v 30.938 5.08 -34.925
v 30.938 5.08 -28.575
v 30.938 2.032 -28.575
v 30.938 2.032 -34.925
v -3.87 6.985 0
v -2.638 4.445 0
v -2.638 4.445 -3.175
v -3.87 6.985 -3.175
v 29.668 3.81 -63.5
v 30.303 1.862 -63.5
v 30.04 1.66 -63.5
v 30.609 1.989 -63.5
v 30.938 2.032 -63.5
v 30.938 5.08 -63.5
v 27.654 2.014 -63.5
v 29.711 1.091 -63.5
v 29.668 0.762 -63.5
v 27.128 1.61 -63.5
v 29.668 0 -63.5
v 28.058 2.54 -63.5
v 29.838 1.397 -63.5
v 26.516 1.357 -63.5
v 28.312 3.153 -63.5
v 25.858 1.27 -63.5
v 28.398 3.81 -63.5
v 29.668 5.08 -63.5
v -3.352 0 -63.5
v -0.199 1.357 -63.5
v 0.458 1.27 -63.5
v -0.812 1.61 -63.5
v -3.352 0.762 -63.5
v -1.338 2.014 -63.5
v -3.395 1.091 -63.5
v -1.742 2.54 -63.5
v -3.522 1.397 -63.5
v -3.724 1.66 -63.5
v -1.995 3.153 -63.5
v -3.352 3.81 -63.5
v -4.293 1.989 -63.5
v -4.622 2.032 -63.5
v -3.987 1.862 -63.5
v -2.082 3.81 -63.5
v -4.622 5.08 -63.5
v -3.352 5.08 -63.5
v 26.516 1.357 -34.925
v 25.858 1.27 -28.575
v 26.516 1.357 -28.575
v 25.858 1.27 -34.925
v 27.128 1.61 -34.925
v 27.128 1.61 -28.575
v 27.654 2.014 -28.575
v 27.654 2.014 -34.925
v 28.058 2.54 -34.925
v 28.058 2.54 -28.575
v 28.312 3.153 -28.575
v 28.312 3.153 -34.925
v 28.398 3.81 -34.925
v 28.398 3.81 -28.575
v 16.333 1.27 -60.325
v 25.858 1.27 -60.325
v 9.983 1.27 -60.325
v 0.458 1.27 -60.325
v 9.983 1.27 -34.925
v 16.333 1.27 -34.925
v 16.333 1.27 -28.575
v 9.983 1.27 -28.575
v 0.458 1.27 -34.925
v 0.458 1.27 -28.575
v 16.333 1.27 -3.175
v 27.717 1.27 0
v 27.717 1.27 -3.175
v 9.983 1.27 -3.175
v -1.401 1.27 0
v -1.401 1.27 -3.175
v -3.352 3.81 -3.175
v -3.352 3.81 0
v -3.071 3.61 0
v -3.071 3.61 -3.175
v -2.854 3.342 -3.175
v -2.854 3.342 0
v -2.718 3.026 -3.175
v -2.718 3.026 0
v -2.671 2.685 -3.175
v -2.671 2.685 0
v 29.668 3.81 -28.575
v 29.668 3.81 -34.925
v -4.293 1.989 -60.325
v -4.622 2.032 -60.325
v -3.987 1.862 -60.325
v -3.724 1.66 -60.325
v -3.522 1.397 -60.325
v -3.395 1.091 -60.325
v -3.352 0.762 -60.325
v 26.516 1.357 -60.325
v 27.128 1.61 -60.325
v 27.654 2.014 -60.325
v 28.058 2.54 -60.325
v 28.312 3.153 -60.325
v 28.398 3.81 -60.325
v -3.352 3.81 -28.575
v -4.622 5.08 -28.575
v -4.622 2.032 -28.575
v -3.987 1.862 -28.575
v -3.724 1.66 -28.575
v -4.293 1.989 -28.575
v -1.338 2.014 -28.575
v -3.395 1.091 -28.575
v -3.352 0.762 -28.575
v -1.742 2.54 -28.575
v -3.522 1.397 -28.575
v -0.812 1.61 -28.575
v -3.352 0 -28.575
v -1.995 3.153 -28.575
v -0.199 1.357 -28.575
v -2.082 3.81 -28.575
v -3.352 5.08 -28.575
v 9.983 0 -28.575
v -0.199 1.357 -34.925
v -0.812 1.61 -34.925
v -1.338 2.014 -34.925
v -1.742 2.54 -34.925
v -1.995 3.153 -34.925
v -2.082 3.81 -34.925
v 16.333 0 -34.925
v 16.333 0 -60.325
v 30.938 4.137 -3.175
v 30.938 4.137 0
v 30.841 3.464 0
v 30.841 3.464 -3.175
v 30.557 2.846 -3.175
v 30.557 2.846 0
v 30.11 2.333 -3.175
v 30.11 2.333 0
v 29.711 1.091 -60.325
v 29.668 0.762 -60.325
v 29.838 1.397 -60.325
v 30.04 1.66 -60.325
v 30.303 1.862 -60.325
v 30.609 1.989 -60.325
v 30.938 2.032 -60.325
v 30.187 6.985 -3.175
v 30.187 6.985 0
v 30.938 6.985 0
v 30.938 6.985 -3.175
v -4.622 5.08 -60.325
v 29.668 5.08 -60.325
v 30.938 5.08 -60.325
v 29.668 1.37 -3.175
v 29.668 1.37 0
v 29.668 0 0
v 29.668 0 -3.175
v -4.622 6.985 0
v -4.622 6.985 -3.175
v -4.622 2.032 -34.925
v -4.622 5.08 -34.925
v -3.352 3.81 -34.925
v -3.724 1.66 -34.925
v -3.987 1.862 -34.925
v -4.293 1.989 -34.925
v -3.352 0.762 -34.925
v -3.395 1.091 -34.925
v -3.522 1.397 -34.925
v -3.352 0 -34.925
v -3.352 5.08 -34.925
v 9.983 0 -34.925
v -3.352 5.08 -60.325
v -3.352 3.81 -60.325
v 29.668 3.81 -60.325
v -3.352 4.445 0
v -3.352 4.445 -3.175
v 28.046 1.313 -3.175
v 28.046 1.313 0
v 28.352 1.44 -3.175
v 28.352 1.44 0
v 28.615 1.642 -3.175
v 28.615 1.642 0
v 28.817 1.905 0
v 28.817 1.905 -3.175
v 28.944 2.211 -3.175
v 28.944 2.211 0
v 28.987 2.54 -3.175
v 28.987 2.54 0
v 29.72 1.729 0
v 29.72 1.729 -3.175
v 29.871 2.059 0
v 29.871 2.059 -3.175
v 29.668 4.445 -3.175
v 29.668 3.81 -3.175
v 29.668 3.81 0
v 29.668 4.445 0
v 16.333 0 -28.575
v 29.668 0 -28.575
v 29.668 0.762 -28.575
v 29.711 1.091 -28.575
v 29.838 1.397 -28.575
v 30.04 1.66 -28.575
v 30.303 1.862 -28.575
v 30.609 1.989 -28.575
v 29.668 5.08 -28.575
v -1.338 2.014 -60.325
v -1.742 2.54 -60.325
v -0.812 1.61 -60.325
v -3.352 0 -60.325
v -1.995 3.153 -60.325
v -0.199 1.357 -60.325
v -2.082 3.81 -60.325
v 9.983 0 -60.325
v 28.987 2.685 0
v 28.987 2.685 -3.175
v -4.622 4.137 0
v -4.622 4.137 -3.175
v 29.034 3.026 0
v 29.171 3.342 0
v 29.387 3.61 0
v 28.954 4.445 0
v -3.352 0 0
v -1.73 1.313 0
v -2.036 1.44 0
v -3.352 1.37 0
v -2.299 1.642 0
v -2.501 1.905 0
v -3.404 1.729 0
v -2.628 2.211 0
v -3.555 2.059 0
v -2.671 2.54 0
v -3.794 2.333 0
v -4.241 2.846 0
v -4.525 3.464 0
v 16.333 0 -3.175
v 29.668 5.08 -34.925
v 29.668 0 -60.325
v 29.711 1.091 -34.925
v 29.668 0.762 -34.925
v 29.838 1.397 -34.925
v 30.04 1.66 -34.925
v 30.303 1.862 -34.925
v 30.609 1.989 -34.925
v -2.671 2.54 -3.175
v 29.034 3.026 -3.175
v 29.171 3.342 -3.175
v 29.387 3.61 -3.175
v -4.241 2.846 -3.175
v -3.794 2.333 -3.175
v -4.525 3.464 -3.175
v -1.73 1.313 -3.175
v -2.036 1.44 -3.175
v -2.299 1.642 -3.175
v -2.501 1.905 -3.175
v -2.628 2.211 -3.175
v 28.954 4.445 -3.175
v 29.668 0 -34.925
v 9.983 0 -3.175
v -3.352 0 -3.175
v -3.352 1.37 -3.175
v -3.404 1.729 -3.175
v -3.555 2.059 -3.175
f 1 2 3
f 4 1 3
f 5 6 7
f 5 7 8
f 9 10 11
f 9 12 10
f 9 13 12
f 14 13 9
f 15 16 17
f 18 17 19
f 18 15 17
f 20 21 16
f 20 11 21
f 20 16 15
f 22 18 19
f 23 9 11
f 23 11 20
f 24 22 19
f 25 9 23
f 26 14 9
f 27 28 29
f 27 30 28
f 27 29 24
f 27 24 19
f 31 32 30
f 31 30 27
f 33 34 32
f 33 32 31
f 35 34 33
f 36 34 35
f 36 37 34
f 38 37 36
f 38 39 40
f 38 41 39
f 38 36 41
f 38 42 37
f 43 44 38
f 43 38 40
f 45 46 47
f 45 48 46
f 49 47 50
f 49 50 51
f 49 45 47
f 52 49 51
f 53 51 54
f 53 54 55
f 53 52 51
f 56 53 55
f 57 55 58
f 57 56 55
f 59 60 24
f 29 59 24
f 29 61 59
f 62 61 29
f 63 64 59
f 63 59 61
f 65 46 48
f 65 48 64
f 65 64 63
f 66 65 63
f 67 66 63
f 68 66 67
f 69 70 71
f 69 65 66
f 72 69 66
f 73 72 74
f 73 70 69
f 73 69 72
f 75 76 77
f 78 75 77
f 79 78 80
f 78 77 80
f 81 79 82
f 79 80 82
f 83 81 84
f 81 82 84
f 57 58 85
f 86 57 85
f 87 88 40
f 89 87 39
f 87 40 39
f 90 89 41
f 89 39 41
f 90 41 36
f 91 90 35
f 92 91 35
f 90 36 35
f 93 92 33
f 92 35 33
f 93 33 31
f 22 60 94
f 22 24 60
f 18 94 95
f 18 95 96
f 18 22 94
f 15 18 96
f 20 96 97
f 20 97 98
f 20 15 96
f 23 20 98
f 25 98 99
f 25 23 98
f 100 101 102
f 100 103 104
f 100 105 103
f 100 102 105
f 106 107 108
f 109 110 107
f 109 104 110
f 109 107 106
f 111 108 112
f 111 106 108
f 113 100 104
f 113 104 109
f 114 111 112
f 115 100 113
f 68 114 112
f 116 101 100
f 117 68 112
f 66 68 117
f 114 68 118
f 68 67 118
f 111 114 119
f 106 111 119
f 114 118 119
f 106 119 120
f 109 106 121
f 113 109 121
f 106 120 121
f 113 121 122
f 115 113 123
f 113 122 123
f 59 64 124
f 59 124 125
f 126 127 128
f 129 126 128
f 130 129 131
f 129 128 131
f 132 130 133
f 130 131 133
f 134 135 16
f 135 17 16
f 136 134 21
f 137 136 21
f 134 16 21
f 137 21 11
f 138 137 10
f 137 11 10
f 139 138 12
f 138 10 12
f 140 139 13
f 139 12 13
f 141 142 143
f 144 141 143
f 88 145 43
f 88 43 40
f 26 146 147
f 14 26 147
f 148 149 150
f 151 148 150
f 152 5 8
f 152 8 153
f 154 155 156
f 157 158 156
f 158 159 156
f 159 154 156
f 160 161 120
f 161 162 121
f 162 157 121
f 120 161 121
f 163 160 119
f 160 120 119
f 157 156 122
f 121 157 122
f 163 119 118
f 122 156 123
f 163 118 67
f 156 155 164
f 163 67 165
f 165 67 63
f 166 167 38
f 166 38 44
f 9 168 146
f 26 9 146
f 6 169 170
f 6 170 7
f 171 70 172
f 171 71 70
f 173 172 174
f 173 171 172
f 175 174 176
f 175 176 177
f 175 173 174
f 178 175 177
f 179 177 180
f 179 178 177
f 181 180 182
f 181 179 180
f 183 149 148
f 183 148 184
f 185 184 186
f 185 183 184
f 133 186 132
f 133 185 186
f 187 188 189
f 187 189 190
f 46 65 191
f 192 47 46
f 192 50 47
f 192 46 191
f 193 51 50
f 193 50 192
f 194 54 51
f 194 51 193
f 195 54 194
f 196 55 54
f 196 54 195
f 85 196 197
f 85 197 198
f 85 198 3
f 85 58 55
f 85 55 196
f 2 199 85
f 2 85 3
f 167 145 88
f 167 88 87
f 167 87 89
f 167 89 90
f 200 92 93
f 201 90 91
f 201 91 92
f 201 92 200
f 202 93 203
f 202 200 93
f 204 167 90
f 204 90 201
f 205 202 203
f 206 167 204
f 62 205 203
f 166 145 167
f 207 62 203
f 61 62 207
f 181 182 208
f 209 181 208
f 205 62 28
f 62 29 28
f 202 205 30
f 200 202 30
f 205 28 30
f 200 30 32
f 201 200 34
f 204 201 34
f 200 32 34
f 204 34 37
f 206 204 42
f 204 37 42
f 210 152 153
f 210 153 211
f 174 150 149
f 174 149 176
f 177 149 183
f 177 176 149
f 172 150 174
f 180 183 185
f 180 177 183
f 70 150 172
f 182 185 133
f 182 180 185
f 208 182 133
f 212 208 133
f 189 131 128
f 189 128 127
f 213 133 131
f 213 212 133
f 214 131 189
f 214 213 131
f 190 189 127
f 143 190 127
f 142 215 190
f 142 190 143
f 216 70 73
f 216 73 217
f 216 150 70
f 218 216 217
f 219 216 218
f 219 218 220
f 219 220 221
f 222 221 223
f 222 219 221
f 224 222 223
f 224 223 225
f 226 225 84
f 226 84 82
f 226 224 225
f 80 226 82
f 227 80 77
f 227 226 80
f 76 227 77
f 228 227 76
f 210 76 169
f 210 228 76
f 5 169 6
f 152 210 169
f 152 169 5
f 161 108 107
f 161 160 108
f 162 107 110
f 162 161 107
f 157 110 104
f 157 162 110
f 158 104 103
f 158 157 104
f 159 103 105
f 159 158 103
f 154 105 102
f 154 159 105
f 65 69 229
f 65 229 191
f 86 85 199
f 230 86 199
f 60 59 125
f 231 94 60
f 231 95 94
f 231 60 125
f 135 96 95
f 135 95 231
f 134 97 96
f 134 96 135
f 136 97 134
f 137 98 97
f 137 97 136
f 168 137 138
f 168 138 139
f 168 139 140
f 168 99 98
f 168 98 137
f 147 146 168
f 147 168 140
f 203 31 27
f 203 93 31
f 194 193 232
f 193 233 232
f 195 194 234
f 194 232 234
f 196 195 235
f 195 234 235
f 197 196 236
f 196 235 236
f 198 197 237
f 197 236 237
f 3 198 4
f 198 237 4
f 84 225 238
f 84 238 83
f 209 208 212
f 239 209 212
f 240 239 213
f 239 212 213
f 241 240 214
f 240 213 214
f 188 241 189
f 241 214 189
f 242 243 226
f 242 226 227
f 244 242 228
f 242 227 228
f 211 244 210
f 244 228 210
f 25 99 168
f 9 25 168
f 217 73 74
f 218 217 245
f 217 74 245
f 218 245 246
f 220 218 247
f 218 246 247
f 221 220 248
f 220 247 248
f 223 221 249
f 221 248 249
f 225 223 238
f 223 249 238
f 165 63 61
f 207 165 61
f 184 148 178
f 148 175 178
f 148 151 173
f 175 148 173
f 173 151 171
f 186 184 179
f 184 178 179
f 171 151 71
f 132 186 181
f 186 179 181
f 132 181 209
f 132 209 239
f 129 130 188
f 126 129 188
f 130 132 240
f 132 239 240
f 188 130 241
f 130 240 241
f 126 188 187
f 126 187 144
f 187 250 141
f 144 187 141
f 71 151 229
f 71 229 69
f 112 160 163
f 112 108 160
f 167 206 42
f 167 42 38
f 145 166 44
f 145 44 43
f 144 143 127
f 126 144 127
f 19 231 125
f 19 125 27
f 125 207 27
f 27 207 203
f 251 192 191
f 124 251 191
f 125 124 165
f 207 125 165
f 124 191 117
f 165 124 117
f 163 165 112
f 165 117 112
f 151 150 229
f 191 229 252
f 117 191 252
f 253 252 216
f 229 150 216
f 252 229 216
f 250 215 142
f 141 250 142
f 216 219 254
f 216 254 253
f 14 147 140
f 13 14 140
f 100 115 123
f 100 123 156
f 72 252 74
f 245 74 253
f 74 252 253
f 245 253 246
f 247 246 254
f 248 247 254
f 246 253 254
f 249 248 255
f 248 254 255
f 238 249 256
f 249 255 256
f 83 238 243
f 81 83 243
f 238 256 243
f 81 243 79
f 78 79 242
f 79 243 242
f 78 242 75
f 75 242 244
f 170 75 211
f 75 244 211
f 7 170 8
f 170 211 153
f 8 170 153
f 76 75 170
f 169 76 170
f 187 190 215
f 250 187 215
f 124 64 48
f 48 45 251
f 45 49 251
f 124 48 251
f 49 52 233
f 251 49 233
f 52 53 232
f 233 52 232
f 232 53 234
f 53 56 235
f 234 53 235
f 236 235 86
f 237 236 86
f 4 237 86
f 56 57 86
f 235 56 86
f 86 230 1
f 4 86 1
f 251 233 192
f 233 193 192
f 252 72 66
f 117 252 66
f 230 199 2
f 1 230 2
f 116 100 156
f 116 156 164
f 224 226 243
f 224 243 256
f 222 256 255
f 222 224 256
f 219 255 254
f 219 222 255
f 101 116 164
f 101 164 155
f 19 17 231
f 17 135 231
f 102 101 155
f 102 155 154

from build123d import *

# Parameters (mm, degrees)
BOSS_EXTRUDE1_DEPTH = 63.5
CUT_EXTRUDE1_REACH  = 72.818
SKETCH2_W           = 14.605
SKETCH2_H           = 25.4
BOSS_EXTRUDE2_DEPTH = 3.175
CUT_EXTRUDE2_REACH  = 72.98
SKETCH4_W           = 0.588974589
SKETCH4_H           = 2.54
FILLET1_R           = 2.38
FILLET2_R           = 1.27
FILLET3_R           = 2.54
FILLET5_R           = 1.27
FILLET6_R           = 1.27


# Some blends are built 0.0001 mm under size
with BuildPart() as part:
    # Sketch1 → Boss-Extrude1 (new body)
    with BuildSketch(Plane.XY):
        Polygon((0, 0), (13.158113026, 0), (13.158113026, 1.27), (-2.081886974, 1.27), (-2.081886974, 3.81), (-3.351886974, 3.81), (-3.351886974, 5.08), (-4.621886974, 5.08), (-4.621886974, 2.032), (-3.351886974, 2.032), (-3.351886974, 0), align=None)
    boss_extrude1 = extrude(amount=-BOSS_EXTRUDE1_DEPTH)

    # Mirror1: Boss-Extrude1 across plane
    add(boss_extrude1.mirror(Plane(origin=(13.158113026, 1.27, -63.5), x_dir=(0, 0, 1), z_dir=(-1, 0, 0))))

    # Cut-Extrude1: up to this face of the body (flat: up to its plane)
    cut_extrude1_end = Plane(part.part.faces().sort_by_distance((13.158113026, 0, -31.75))[0])
    # Sketch2 → Cut-Extrude1 (cut, up to the picked face)
    with BuildSketch(Plane(origin=(0, 5.08, 0), x_dir=(1, 0, 0), z_dir=(0, 1, 0)), mode=Mode.PRIVATE) as cut_extrude1_sk1:
        with Locations((2.680613026, 15.875)):
            Rectangle(SKETCH2_W, SKETCH2_H)
    cut_extrude1_tool1 = split(extrude(cut_extrude1_sk1.sketch, amount=-CUT_EXTRUDE1_REACH, mode=Mode.PRIVATE), bisect_by=cut_extrude1_end, keep=Keep.BOTH, mode=Mode.PRIVATE)
    # Sketch2 → Cut-Extrude1 (cut, up to the picked face)
    with BuildSketch(Plane(origin=(0, 5.08, 0), x_dir=(1, 0, 0), z_dir=(0, 1, 0)), mode=Mode.PRIVATE) as cut_extrude1_sk2:
        with Locations((23.635613026, 15.875)):
            Rectangle(SKETCH2_W, SKETCH2_H)
    cut_extrude1_tool2 = split(extrude(cut_extrude1_sk2.sketch, amount=-CUT_EXTRUDE1_REACH, mode=Mode.PRIVATE), bisect_by=cut_extrude1_end, keep=Keep.BOTH, mode=Mode.PRIVATE)
    # Sketch2 → Cut-Extrude1 (cut, up to the picked face)
    with BuildSketch(Plane(origin=(0, 5.08, 0), x_dir=(1, 0, 0), z_dir=(0, 1, 0)), mode=Mode.PRIVATE) as cut_extrude1_sk3:
        with Locations((2.680613026, 47.625)):
            Rectangle(SKETCH2_W, SKETCH2_H)
    cut_extrude1_tool3 = split(extrude(cut_extrude1_sk3.sketch, amount=-CUT_EXTRUDE1_REACH, mode=Mode.PRIVATE), bisect_by=cut_extrude1_end, keep=Keep.BOTH, mode=Mode.PRIVATE)
    # Sketch2 → Cut-Extrude1 (cut, up to the picked face)
    with BuildSketch(Plane(origin=(0, 5.08, 0), x_dir=(1, 0, 0), z_dir=(0, 1, 0)), mode=Mode.PRIVATE) as cut_extrude1_sk4:
        with Locations((23.635613026, 47.625)):
            Rectangle(SKETCH2_W, SKETCH2_H)
    cut_extrude1_tool4 = split(extrude(cut_extrude1_sk4.sketch, amount=-CUT_EXTRUDE1_REACH, mode=Mode.PRIVATE), bisect_by=cut_extrude1_end, keep=Keep.BOTH, mode=Mode.PRIVATE)
    add(cut_extrude1_tool1.solids().sort_by(Axis((2.680613, 5.08, -15.875), (0, -1, 0)))[0], mode=Mode.SUBTRACT)
    add(cut_extrude1_tool2.solids().sort_by(Axis((23.635613, 5.08, -15.875), (0, -1, 0)))[0], mode=Mode.SUBTRACT)
    add(cut_extrude1_tool3.solids().sort_by(Axis((2.680613, 5.08, -47.625), (0, -1, 0)))[0], mode=Mode.SUBTRACT)
    add(cut_extrude1_tool4.solids().sort_by(Axis((23.635613, 5.08, -47.625), (0, -1, 0)))[0], mode=Mode.SUBTRACT)

    # Sketch3 → Boss-Extrude2 (add)
    with BuildSketch(Plane.XY):
        Polygon((-4.621886974, 4.445), (-2.637712851, 4.445), (-3.870360235, 6.985), (-4.621886974, 6.985), align=None)
    boss_extrude2 = extrude(amount=-BOSS_EXTRUDE2_DEPTH)

    # Mirror2: Boss-Extrude2 across plane
    add(boss_extrude2.mirror(Plane.ZY.offset(-13.158113026)))

    # Sketch4 → Cut-Extrude2 (cut, up to next)
    with BuildSketch(Plane.XY, mode=Mode.PRIVATE) as cut_extrude2_sk1:
        with Locations((-2.376374269, 2.54)):
            Rectangle(SKETCH4_W, SKETCH4_H)
    cut_extrude2_tool1 = extrude(cut_extrude2_sk1.sketch, amount=-CUT_EXTRUDE2_REACH, mode=Mode.PRIVATE) & part.part
    cut_extrude2 = cut_extrude2_tool1.solids().sort_by_distance((-2.376374, 2.54, 0))[0]
    add(cut_extrude2, mode=Mode.SUBTRACT)

    # Mirror3: Cut-Extrude2 across plane
    add(cut_extrude2.mirror(Plane.ZY.offset(-13.158113026)), mode=Mode.SUBTRACT)

    # Fillet1
    # the kernel refuses this fillet: 2.38 mm, written as the material it takes off along each edge
    with BuildSketch(Plane(origin=(30.938113026, 2.032, 5.263257071), x_dir=(0, 1, 0), z_dir=(0, 0, -1))) as fillet1_piece_1:
        with BuildLine():
            CenterArc((2.105302829, -2.38), FILLET1_R, 90, 62.200005552)
            Line((0, -1.27), (-0.042106057, -1.2478))
            ThreePointArc((-0.042106057, -1.2478), (-0.0476, -0.635), (-0.0476, 0))
            Line((-0.0476, 0), (0, 0.0476))
            Line((0, 0.0476), (2.105302829, 0.0476))
            Line((2.105302829, 0.0476), (2.105302829, 0))
        make_face()
    extrude(amount=13.701514143, mode=Mode.SUBTRACT)
    with BuildSketch(Plane(origin=(-4.621886974, 2.032, 5.263257071), x_dir=(1, 0, 0), z_dir=(0, 0, -1))) as fillet1_piece_2:
        with BuildLine():
            CenterArc((2.38, -2.105302829), FILLET1_R, 117.799994448, 62.200005552)
            Line((0, -2.105302829), (-0.0476, -2.105302829))
            Line((-0.0476, -2.105302829), (-0.0476, 0))
            Line((-0.0476, 0), (0, 0.0476))
            ThreePointArc((0, 0.0476), (0.635, 0.0476), (1.2478, 0.042106057))
            Line((1.2478, 0.042106057), (1.27, 0))
        make_face()
    extrude(amount=13.701514143, mode=Mode.SUBTRACT)

    # Fillet2
    # the kernel refuses this fillet: 1.27 mm, written as the material it adds along each edge
    with BuildSketch(Plane(origin=(-3.351886974, 2.032, 0), x_dir=(0, -1, 0), z_dir=(0, 0, -1))) as fillet2_piece_1:
        with BuildLine():
            CenterArc((0.662024402, 1.27), FILLET2_R, 220.696704321, 49.303295679)
            ThreePointArc((-0.30085384, 0.441890411), (-0.137980638, 0.229419053), (0, 0))
            Line((0, 0), (0.662024402, 0))
        make_face()
    extrude(amount=3.175)
    with BuildSketch(Plane(origin=(29.668113026, 2.032, 0), x_dir=(0, -1, 0), z_dir=(0, 0, -1))) as fillet2_piece_2:
        with BuildLine():
            CenterArc((0.662024402, -1.27), FILLET2_R, 90, 49.303295679)
            ThreePointArc((-0.30085384, -0.441890411), (-0.137980638, -0.229419053), (0, 0))
            Line((0, 0), (0.662024402, 0))
        make_face()
    extrude(amount=3.175)
    # the kernel refuses this fillet: 1.27 mm, written as the material it takes off along each edge
    with BuildSketch(Plane(origin=(28.987087615, 3.81, 2.81292656), x_dir=(0, -1, 0), z_dir=(0, 0, -1))) as fillet2_2_piece_1:
        with BuildLine():
            CenterArc((1.125170624, -1.27), FILLET2_R, 90, 62.370030247)
            Line((0, -0.681025411), (0, 0))
            Line((0, 0), (1.125170624, 0))
        make_face()
    extrude(amount=8.800853121, mode=Mode.SUBTRACT)
    with BuildSketch(Plane(origin=(-2.670861563, 3.81, 2.81292656), x_dir=(-1, 0, 0), z_dir=(0, 0, -1))) as fillet2_2_piece_2:
        with BuildLine():
            CenterArc((1.27, -1.125170624), FILLET2_R, 117.629969753, 62.370030247)
            Line((0, -1.125170624), (0, 0))
            Line((0, 0), (0.681025411, 0))
        make_face()
    extrude(amount=8.800853121, mode=Mode.SUBTRACT)

    # Fillet3
    fillet3_edges = [part.edges().sort_by_distance(p)[0] for p in [
        (28.398113026, 1.27, -31.75),
        (28.398113026, 1.27, -61.9125),
        (-2.081886974, 1.27, -61.9125),
        (-2.081886974, 1.27, -31.75),
    ]]
    fillet(fillet3_edges, radius=FILLET3_R - 0.0001)  # a hair under: the kernel refuses the full size

    # Fillet5
    fillet5_edges = [part.edges().sort_by_distance(p)[0] for p in [
        (29.668113026, 2.032, -61.9125),
        (29.668113026, 2.032, -31.75),
        (-3.351886974, 2.032, -61.9125),
        (-3.351886974, 2.032, -31.75),
    ]]
    fillet(fillet5_edges, radius=FILLET5_R - 0.0001)  # a hair under: the kernel refuses the full size

    # Fillet6
    fillet6_edges = [part.edges().sort_by_distance(p)[0] for p in [
        (-2.670861563, 1.27, -1.5875),
        (28.987087615, 1.27, -1.5875),
    ]]
    fillet(fillet6_edges, radius=FILLET6_R)


solid = part.part
